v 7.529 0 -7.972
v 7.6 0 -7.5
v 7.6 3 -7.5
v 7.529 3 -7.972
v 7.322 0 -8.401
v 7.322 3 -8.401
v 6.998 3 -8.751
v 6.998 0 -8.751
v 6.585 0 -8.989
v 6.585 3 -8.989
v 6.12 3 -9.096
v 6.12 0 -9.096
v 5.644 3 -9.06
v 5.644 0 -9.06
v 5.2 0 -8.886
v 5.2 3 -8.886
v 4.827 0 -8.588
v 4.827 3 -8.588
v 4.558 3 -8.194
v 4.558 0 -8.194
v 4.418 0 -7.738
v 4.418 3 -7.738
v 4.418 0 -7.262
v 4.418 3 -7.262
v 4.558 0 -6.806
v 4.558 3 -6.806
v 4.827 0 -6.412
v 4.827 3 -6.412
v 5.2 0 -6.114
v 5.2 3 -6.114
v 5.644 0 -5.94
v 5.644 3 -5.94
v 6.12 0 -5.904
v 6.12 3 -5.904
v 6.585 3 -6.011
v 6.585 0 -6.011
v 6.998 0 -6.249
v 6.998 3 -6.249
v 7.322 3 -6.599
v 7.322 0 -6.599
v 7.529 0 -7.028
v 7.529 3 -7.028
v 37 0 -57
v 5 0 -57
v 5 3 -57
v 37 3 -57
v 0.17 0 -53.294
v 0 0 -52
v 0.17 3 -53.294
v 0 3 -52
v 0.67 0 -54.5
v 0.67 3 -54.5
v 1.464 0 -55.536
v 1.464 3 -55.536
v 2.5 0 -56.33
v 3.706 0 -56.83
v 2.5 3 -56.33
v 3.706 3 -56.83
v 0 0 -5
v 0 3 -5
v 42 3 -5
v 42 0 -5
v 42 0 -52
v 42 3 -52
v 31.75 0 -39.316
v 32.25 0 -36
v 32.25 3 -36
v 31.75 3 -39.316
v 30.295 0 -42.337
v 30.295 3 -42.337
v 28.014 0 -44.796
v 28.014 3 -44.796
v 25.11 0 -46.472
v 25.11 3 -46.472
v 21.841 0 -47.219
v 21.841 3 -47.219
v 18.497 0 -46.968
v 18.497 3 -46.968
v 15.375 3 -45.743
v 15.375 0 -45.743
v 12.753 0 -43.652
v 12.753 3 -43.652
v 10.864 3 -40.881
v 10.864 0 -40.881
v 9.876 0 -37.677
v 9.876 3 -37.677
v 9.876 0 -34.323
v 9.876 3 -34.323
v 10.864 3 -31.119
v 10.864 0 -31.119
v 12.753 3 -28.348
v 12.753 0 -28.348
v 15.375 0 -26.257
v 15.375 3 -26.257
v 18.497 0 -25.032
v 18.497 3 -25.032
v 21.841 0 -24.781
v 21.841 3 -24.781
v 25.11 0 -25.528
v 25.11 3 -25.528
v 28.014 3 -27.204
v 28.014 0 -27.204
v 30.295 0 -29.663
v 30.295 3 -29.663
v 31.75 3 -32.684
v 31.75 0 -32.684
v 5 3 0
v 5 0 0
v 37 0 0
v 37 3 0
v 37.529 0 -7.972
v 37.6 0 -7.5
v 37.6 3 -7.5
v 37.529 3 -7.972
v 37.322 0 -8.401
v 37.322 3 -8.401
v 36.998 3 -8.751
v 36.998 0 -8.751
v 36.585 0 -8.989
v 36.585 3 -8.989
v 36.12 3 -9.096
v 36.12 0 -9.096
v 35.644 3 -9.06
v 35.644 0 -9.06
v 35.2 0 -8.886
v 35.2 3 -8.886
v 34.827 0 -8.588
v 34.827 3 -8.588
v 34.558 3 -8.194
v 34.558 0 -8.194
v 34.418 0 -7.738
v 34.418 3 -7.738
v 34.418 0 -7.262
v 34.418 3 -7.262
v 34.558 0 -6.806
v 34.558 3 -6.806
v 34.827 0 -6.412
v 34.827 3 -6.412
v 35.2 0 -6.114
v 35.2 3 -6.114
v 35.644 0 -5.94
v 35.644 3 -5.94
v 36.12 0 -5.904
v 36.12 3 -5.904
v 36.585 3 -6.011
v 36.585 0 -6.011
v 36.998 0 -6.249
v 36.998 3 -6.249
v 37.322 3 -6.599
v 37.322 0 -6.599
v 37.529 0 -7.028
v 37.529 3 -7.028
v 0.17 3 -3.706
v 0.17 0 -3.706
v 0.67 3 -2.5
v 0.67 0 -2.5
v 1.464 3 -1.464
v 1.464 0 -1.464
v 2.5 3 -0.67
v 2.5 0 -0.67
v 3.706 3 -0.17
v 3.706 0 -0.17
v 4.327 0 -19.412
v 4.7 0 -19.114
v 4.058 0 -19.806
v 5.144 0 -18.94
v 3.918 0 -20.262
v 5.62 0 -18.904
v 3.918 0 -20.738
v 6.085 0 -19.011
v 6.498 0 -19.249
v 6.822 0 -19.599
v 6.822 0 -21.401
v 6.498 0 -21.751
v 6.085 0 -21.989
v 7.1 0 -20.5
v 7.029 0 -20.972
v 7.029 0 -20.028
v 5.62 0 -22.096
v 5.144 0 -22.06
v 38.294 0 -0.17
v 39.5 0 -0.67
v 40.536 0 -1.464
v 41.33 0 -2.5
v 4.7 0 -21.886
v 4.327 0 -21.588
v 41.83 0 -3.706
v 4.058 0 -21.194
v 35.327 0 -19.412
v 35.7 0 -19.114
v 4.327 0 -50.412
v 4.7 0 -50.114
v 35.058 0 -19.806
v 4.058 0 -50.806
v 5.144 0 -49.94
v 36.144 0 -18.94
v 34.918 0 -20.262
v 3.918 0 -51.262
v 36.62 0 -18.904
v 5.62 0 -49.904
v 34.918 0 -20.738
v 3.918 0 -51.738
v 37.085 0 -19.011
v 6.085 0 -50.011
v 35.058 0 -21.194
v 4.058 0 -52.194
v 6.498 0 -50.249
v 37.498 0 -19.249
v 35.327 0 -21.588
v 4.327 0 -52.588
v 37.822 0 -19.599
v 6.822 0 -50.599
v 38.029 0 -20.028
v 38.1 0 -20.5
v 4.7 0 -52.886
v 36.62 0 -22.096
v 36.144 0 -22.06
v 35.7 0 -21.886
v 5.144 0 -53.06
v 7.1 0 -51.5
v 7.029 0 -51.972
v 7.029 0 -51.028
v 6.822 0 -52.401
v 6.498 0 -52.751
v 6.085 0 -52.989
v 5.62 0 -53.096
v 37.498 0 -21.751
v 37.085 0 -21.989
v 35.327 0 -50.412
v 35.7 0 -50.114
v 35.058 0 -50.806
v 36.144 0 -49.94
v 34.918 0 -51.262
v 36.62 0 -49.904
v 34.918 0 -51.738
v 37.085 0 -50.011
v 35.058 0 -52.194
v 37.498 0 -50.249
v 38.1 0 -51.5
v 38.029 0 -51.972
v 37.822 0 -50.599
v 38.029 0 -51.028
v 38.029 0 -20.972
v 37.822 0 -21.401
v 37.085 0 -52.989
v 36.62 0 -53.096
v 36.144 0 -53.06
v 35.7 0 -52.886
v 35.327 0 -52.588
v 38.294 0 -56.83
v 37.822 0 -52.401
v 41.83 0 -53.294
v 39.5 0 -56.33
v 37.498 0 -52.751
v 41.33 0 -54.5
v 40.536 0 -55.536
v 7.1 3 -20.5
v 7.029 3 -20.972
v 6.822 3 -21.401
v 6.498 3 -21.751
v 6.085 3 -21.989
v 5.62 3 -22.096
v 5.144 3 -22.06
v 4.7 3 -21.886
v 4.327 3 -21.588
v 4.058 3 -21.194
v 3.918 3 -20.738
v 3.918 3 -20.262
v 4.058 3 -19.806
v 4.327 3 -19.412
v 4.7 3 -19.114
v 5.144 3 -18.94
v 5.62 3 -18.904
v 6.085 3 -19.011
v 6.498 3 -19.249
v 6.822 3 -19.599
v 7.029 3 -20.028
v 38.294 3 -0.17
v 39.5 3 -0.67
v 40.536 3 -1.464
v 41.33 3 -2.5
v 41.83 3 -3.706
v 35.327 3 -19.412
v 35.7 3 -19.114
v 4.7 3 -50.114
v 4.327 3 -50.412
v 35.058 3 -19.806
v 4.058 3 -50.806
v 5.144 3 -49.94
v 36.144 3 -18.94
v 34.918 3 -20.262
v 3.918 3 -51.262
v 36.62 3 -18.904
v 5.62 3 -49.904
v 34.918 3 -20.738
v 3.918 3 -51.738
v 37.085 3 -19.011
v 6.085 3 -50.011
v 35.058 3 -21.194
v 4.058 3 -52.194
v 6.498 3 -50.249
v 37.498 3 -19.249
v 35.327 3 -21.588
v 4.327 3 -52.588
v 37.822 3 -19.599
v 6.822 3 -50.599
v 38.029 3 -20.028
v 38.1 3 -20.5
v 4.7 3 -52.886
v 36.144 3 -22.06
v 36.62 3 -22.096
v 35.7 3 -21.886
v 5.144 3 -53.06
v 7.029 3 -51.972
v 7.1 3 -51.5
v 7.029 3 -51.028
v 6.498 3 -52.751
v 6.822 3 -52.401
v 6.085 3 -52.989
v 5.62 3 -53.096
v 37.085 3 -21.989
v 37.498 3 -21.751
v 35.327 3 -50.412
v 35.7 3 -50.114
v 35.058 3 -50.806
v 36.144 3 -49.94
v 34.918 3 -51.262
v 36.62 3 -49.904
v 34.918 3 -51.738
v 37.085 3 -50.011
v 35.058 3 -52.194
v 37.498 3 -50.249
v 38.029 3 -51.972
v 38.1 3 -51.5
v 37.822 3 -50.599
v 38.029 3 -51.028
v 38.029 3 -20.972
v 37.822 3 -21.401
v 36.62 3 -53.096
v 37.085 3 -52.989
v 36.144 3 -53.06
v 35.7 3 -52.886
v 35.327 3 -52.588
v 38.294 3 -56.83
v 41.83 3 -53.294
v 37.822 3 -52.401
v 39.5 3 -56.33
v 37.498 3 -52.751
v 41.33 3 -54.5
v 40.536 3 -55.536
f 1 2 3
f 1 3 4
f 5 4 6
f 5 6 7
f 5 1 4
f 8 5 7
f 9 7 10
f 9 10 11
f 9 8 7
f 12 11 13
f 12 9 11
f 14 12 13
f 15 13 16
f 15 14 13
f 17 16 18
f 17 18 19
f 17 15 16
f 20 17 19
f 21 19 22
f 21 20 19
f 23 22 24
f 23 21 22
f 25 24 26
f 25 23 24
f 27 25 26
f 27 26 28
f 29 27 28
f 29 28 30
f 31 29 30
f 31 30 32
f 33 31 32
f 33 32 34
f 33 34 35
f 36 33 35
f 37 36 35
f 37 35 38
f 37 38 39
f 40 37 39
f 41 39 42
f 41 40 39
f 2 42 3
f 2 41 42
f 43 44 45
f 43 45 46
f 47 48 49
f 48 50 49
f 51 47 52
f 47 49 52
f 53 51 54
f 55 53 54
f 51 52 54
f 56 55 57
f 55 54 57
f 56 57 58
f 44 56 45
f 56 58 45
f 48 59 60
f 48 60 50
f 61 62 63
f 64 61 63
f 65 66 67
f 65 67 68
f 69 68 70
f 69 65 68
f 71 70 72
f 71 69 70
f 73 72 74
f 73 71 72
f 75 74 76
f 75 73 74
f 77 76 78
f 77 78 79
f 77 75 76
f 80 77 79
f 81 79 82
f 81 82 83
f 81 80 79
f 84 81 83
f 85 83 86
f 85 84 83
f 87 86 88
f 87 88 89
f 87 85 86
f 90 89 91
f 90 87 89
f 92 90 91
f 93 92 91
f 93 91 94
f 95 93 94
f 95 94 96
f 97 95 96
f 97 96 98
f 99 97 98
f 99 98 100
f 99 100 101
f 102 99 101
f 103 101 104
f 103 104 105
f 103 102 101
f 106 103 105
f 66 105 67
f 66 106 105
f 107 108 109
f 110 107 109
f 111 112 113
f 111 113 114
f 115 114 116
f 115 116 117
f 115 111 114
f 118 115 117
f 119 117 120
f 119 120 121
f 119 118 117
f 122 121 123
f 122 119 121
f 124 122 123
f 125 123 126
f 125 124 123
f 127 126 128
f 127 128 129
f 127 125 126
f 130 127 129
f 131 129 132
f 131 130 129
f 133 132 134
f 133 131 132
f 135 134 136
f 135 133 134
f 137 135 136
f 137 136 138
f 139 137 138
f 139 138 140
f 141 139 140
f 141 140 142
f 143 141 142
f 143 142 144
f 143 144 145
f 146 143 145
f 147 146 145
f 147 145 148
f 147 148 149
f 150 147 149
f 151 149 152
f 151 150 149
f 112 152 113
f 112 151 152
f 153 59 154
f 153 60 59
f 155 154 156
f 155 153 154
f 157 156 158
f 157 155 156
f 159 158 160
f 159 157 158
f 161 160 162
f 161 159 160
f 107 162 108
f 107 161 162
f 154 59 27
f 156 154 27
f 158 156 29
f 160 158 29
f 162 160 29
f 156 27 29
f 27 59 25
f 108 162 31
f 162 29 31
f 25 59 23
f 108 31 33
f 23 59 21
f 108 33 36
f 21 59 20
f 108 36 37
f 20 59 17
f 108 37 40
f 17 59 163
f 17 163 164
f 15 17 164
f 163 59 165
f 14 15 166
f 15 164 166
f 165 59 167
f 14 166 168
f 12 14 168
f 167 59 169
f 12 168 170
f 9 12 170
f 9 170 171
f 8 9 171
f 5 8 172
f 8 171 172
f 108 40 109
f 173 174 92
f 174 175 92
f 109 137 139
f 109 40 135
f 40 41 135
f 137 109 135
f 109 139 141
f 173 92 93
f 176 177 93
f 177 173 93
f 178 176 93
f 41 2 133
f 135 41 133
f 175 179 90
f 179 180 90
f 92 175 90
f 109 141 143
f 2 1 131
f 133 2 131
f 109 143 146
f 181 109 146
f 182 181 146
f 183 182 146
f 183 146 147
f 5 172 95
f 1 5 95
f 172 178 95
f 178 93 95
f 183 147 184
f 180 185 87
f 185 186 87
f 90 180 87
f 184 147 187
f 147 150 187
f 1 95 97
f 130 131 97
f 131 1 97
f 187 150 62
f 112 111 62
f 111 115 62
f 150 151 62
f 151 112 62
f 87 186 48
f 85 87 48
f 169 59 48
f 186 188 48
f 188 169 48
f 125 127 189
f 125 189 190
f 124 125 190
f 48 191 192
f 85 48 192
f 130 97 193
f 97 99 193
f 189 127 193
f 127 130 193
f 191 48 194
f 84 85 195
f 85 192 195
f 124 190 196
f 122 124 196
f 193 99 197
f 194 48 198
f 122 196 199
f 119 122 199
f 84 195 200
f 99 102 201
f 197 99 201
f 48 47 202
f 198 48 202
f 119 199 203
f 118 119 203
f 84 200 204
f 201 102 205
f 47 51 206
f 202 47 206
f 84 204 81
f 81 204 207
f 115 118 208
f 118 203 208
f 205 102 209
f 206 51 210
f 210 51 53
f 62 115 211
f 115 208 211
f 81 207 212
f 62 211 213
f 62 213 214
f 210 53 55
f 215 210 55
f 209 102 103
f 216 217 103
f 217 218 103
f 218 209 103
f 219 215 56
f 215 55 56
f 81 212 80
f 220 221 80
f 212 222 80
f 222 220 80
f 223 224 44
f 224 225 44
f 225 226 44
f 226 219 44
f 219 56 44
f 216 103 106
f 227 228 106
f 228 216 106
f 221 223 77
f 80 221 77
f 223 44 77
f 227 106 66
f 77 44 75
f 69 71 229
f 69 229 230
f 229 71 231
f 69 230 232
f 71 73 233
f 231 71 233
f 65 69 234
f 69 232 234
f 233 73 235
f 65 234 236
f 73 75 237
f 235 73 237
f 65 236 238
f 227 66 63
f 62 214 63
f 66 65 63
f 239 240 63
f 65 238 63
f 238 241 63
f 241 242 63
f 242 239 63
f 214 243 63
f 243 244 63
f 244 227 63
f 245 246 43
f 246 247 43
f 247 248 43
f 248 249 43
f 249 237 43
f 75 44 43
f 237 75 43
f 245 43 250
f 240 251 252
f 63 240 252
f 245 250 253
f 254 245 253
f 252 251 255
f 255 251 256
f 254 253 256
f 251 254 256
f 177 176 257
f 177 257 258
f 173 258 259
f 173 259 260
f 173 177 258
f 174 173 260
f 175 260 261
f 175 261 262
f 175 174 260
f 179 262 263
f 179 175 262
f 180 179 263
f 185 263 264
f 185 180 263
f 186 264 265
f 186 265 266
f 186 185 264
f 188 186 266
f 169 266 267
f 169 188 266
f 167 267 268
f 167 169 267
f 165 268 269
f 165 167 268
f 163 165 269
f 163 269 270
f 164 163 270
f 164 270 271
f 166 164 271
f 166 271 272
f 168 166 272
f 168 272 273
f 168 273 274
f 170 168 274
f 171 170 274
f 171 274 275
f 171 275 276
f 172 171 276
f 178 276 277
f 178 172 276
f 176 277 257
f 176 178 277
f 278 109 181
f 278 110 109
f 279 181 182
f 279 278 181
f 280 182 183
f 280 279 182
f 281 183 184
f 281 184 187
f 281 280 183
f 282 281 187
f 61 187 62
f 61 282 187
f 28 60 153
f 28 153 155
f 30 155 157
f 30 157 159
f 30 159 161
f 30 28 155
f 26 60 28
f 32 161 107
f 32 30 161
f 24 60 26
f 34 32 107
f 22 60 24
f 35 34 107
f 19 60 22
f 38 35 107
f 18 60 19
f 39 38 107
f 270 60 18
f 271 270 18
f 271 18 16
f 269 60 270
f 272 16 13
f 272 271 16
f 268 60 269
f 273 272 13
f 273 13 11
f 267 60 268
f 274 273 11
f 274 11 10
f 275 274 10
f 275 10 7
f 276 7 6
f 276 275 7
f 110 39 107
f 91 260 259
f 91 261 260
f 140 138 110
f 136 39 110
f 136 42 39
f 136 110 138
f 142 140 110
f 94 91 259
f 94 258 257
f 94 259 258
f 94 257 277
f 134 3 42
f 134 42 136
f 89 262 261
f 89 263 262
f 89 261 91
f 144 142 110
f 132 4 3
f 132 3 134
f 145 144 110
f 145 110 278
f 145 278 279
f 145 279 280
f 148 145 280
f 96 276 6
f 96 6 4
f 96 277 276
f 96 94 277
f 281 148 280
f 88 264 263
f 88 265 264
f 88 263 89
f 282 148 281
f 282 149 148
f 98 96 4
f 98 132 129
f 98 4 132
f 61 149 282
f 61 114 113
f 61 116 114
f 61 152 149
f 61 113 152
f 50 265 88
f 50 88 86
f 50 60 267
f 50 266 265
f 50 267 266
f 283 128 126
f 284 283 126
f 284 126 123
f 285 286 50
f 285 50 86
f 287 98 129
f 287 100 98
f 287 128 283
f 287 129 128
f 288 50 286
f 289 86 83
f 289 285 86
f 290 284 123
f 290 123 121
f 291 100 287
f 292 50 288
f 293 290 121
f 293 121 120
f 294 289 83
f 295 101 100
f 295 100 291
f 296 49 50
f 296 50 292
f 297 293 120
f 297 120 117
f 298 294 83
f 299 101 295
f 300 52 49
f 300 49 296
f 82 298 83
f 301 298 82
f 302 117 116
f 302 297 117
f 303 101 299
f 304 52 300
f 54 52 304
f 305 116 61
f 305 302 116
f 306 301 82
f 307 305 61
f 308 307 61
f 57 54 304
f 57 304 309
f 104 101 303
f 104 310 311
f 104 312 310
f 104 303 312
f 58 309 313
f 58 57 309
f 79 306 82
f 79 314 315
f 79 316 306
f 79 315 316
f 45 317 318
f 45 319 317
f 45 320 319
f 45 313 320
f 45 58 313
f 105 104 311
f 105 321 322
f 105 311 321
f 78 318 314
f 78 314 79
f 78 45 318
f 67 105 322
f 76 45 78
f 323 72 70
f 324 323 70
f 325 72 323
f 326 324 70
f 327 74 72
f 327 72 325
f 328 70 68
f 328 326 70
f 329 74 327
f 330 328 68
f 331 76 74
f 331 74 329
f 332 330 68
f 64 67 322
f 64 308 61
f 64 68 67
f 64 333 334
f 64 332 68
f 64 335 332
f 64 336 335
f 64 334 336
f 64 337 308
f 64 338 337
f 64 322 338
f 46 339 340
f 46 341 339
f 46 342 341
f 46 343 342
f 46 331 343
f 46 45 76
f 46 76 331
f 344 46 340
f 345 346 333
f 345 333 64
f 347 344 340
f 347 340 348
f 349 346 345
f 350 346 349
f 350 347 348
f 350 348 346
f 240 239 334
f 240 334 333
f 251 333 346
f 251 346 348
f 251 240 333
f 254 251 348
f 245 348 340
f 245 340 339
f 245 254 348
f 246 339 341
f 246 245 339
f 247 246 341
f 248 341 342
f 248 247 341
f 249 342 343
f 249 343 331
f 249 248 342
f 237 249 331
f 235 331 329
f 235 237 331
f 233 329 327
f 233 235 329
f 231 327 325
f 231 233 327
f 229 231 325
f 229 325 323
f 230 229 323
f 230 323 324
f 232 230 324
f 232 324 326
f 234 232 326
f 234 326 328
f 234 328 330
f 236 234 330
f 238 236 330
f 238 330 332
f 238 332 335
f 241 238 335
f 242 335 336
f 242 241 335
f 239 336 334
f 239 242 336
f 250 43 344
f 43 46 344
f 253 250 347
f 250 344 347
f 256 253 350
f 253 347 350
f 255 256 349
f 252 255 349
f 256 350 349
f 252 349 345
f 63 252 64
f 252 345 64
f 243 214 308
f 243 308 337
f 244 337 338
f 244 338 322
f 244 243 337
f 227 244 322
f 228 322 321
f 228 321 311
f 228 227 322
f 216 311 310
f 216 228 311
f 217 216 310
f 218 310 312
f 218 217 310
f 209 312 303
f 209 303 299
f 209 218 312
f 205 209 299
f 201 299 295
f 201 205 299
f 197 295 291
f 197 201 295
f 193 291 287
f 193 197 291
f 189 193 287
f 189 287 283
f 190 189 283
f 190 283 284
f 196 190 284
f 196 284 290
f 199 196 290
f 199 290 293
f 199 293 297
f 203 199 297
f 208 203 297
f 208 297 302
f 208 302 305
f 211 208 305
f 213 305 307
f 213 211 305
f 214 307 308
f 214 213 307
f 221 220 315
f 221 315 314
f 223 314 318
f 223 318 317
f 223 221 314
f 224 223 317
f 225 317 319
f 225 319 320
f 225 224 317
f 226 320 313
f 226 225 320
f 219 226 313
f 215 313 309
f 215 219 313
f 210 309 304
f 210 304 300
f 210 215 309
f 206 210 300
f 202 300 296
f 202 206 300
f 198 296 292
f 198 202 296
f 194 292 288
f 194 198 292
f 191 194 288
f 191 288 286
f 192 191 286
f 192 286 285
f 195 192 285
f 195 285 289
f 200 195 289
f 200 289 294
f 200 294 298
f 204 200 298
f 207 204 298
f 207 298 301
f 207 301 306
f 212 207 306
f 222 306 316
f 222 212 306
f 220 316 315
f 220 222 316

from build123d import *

# Parameters (mm, degrees)
SKETCH1_W           = 42
SKETCH1_H           = 57
SKETCH1_R           = 1.6
SKETCH1_R_2         = 11.25
BOSS_EXTRUDE1_DEPTH = 3
FILLET1_R           = 5


with BuildPart() as part:
    # Sketch1 → Boss-Extrude1 (new body)
    with BuildSketch(Plane(origin=(0, 0, 0), x_dir=(1, 0, 0), z_dir=(0, 1, 0))):
        with Locations((21, 28.5)):
            Rectangle(SKETCH1_W, SKETCH1_H)
        with Locations((36.5, 51.5)):
            Circle(SKETCH1_R, mode=Mode.SUBTRACT)
        with Locations((5.5, 51.5)):
            Circle(SKETCH1_R, mode=Mode.SUBTRACT)
        with Locations((5.5, 20.5)):
            Circle(SKETCH1_R, mode=Mode.SUBTRACT)
        with Locations((36.5, 20.5)):
            Circle(SKETCH1_R, mode=Mode.SUBTRACT)
        with Locations((6, 7.5)):
            Circle(SKETCH1_R, mode=Mode.SUBTRACT)
        with Locations((36, 7.5)):
            Circle(SKETCH1_R, mode=Mode.SUBTRACT)
        with Locations((21, 36)):
            Circle(SKETCH1_R_2, mode=Mode.SUBTRACT)
    extrude(amount=BOSS_EXTRUDE1_DEPTH)

    # Fillet1
    fillet1_edges = [part.edges().sort_by_distance(p)[0] for p in [
        (0, 1.5, -57),
        (42, 1.5, -57),
        (42, 1.5, 0),
        (0, 1.5, 0),
    ]]
    fillet(fillet1_edges, radius=FILLET1_R)


solid = part.part
